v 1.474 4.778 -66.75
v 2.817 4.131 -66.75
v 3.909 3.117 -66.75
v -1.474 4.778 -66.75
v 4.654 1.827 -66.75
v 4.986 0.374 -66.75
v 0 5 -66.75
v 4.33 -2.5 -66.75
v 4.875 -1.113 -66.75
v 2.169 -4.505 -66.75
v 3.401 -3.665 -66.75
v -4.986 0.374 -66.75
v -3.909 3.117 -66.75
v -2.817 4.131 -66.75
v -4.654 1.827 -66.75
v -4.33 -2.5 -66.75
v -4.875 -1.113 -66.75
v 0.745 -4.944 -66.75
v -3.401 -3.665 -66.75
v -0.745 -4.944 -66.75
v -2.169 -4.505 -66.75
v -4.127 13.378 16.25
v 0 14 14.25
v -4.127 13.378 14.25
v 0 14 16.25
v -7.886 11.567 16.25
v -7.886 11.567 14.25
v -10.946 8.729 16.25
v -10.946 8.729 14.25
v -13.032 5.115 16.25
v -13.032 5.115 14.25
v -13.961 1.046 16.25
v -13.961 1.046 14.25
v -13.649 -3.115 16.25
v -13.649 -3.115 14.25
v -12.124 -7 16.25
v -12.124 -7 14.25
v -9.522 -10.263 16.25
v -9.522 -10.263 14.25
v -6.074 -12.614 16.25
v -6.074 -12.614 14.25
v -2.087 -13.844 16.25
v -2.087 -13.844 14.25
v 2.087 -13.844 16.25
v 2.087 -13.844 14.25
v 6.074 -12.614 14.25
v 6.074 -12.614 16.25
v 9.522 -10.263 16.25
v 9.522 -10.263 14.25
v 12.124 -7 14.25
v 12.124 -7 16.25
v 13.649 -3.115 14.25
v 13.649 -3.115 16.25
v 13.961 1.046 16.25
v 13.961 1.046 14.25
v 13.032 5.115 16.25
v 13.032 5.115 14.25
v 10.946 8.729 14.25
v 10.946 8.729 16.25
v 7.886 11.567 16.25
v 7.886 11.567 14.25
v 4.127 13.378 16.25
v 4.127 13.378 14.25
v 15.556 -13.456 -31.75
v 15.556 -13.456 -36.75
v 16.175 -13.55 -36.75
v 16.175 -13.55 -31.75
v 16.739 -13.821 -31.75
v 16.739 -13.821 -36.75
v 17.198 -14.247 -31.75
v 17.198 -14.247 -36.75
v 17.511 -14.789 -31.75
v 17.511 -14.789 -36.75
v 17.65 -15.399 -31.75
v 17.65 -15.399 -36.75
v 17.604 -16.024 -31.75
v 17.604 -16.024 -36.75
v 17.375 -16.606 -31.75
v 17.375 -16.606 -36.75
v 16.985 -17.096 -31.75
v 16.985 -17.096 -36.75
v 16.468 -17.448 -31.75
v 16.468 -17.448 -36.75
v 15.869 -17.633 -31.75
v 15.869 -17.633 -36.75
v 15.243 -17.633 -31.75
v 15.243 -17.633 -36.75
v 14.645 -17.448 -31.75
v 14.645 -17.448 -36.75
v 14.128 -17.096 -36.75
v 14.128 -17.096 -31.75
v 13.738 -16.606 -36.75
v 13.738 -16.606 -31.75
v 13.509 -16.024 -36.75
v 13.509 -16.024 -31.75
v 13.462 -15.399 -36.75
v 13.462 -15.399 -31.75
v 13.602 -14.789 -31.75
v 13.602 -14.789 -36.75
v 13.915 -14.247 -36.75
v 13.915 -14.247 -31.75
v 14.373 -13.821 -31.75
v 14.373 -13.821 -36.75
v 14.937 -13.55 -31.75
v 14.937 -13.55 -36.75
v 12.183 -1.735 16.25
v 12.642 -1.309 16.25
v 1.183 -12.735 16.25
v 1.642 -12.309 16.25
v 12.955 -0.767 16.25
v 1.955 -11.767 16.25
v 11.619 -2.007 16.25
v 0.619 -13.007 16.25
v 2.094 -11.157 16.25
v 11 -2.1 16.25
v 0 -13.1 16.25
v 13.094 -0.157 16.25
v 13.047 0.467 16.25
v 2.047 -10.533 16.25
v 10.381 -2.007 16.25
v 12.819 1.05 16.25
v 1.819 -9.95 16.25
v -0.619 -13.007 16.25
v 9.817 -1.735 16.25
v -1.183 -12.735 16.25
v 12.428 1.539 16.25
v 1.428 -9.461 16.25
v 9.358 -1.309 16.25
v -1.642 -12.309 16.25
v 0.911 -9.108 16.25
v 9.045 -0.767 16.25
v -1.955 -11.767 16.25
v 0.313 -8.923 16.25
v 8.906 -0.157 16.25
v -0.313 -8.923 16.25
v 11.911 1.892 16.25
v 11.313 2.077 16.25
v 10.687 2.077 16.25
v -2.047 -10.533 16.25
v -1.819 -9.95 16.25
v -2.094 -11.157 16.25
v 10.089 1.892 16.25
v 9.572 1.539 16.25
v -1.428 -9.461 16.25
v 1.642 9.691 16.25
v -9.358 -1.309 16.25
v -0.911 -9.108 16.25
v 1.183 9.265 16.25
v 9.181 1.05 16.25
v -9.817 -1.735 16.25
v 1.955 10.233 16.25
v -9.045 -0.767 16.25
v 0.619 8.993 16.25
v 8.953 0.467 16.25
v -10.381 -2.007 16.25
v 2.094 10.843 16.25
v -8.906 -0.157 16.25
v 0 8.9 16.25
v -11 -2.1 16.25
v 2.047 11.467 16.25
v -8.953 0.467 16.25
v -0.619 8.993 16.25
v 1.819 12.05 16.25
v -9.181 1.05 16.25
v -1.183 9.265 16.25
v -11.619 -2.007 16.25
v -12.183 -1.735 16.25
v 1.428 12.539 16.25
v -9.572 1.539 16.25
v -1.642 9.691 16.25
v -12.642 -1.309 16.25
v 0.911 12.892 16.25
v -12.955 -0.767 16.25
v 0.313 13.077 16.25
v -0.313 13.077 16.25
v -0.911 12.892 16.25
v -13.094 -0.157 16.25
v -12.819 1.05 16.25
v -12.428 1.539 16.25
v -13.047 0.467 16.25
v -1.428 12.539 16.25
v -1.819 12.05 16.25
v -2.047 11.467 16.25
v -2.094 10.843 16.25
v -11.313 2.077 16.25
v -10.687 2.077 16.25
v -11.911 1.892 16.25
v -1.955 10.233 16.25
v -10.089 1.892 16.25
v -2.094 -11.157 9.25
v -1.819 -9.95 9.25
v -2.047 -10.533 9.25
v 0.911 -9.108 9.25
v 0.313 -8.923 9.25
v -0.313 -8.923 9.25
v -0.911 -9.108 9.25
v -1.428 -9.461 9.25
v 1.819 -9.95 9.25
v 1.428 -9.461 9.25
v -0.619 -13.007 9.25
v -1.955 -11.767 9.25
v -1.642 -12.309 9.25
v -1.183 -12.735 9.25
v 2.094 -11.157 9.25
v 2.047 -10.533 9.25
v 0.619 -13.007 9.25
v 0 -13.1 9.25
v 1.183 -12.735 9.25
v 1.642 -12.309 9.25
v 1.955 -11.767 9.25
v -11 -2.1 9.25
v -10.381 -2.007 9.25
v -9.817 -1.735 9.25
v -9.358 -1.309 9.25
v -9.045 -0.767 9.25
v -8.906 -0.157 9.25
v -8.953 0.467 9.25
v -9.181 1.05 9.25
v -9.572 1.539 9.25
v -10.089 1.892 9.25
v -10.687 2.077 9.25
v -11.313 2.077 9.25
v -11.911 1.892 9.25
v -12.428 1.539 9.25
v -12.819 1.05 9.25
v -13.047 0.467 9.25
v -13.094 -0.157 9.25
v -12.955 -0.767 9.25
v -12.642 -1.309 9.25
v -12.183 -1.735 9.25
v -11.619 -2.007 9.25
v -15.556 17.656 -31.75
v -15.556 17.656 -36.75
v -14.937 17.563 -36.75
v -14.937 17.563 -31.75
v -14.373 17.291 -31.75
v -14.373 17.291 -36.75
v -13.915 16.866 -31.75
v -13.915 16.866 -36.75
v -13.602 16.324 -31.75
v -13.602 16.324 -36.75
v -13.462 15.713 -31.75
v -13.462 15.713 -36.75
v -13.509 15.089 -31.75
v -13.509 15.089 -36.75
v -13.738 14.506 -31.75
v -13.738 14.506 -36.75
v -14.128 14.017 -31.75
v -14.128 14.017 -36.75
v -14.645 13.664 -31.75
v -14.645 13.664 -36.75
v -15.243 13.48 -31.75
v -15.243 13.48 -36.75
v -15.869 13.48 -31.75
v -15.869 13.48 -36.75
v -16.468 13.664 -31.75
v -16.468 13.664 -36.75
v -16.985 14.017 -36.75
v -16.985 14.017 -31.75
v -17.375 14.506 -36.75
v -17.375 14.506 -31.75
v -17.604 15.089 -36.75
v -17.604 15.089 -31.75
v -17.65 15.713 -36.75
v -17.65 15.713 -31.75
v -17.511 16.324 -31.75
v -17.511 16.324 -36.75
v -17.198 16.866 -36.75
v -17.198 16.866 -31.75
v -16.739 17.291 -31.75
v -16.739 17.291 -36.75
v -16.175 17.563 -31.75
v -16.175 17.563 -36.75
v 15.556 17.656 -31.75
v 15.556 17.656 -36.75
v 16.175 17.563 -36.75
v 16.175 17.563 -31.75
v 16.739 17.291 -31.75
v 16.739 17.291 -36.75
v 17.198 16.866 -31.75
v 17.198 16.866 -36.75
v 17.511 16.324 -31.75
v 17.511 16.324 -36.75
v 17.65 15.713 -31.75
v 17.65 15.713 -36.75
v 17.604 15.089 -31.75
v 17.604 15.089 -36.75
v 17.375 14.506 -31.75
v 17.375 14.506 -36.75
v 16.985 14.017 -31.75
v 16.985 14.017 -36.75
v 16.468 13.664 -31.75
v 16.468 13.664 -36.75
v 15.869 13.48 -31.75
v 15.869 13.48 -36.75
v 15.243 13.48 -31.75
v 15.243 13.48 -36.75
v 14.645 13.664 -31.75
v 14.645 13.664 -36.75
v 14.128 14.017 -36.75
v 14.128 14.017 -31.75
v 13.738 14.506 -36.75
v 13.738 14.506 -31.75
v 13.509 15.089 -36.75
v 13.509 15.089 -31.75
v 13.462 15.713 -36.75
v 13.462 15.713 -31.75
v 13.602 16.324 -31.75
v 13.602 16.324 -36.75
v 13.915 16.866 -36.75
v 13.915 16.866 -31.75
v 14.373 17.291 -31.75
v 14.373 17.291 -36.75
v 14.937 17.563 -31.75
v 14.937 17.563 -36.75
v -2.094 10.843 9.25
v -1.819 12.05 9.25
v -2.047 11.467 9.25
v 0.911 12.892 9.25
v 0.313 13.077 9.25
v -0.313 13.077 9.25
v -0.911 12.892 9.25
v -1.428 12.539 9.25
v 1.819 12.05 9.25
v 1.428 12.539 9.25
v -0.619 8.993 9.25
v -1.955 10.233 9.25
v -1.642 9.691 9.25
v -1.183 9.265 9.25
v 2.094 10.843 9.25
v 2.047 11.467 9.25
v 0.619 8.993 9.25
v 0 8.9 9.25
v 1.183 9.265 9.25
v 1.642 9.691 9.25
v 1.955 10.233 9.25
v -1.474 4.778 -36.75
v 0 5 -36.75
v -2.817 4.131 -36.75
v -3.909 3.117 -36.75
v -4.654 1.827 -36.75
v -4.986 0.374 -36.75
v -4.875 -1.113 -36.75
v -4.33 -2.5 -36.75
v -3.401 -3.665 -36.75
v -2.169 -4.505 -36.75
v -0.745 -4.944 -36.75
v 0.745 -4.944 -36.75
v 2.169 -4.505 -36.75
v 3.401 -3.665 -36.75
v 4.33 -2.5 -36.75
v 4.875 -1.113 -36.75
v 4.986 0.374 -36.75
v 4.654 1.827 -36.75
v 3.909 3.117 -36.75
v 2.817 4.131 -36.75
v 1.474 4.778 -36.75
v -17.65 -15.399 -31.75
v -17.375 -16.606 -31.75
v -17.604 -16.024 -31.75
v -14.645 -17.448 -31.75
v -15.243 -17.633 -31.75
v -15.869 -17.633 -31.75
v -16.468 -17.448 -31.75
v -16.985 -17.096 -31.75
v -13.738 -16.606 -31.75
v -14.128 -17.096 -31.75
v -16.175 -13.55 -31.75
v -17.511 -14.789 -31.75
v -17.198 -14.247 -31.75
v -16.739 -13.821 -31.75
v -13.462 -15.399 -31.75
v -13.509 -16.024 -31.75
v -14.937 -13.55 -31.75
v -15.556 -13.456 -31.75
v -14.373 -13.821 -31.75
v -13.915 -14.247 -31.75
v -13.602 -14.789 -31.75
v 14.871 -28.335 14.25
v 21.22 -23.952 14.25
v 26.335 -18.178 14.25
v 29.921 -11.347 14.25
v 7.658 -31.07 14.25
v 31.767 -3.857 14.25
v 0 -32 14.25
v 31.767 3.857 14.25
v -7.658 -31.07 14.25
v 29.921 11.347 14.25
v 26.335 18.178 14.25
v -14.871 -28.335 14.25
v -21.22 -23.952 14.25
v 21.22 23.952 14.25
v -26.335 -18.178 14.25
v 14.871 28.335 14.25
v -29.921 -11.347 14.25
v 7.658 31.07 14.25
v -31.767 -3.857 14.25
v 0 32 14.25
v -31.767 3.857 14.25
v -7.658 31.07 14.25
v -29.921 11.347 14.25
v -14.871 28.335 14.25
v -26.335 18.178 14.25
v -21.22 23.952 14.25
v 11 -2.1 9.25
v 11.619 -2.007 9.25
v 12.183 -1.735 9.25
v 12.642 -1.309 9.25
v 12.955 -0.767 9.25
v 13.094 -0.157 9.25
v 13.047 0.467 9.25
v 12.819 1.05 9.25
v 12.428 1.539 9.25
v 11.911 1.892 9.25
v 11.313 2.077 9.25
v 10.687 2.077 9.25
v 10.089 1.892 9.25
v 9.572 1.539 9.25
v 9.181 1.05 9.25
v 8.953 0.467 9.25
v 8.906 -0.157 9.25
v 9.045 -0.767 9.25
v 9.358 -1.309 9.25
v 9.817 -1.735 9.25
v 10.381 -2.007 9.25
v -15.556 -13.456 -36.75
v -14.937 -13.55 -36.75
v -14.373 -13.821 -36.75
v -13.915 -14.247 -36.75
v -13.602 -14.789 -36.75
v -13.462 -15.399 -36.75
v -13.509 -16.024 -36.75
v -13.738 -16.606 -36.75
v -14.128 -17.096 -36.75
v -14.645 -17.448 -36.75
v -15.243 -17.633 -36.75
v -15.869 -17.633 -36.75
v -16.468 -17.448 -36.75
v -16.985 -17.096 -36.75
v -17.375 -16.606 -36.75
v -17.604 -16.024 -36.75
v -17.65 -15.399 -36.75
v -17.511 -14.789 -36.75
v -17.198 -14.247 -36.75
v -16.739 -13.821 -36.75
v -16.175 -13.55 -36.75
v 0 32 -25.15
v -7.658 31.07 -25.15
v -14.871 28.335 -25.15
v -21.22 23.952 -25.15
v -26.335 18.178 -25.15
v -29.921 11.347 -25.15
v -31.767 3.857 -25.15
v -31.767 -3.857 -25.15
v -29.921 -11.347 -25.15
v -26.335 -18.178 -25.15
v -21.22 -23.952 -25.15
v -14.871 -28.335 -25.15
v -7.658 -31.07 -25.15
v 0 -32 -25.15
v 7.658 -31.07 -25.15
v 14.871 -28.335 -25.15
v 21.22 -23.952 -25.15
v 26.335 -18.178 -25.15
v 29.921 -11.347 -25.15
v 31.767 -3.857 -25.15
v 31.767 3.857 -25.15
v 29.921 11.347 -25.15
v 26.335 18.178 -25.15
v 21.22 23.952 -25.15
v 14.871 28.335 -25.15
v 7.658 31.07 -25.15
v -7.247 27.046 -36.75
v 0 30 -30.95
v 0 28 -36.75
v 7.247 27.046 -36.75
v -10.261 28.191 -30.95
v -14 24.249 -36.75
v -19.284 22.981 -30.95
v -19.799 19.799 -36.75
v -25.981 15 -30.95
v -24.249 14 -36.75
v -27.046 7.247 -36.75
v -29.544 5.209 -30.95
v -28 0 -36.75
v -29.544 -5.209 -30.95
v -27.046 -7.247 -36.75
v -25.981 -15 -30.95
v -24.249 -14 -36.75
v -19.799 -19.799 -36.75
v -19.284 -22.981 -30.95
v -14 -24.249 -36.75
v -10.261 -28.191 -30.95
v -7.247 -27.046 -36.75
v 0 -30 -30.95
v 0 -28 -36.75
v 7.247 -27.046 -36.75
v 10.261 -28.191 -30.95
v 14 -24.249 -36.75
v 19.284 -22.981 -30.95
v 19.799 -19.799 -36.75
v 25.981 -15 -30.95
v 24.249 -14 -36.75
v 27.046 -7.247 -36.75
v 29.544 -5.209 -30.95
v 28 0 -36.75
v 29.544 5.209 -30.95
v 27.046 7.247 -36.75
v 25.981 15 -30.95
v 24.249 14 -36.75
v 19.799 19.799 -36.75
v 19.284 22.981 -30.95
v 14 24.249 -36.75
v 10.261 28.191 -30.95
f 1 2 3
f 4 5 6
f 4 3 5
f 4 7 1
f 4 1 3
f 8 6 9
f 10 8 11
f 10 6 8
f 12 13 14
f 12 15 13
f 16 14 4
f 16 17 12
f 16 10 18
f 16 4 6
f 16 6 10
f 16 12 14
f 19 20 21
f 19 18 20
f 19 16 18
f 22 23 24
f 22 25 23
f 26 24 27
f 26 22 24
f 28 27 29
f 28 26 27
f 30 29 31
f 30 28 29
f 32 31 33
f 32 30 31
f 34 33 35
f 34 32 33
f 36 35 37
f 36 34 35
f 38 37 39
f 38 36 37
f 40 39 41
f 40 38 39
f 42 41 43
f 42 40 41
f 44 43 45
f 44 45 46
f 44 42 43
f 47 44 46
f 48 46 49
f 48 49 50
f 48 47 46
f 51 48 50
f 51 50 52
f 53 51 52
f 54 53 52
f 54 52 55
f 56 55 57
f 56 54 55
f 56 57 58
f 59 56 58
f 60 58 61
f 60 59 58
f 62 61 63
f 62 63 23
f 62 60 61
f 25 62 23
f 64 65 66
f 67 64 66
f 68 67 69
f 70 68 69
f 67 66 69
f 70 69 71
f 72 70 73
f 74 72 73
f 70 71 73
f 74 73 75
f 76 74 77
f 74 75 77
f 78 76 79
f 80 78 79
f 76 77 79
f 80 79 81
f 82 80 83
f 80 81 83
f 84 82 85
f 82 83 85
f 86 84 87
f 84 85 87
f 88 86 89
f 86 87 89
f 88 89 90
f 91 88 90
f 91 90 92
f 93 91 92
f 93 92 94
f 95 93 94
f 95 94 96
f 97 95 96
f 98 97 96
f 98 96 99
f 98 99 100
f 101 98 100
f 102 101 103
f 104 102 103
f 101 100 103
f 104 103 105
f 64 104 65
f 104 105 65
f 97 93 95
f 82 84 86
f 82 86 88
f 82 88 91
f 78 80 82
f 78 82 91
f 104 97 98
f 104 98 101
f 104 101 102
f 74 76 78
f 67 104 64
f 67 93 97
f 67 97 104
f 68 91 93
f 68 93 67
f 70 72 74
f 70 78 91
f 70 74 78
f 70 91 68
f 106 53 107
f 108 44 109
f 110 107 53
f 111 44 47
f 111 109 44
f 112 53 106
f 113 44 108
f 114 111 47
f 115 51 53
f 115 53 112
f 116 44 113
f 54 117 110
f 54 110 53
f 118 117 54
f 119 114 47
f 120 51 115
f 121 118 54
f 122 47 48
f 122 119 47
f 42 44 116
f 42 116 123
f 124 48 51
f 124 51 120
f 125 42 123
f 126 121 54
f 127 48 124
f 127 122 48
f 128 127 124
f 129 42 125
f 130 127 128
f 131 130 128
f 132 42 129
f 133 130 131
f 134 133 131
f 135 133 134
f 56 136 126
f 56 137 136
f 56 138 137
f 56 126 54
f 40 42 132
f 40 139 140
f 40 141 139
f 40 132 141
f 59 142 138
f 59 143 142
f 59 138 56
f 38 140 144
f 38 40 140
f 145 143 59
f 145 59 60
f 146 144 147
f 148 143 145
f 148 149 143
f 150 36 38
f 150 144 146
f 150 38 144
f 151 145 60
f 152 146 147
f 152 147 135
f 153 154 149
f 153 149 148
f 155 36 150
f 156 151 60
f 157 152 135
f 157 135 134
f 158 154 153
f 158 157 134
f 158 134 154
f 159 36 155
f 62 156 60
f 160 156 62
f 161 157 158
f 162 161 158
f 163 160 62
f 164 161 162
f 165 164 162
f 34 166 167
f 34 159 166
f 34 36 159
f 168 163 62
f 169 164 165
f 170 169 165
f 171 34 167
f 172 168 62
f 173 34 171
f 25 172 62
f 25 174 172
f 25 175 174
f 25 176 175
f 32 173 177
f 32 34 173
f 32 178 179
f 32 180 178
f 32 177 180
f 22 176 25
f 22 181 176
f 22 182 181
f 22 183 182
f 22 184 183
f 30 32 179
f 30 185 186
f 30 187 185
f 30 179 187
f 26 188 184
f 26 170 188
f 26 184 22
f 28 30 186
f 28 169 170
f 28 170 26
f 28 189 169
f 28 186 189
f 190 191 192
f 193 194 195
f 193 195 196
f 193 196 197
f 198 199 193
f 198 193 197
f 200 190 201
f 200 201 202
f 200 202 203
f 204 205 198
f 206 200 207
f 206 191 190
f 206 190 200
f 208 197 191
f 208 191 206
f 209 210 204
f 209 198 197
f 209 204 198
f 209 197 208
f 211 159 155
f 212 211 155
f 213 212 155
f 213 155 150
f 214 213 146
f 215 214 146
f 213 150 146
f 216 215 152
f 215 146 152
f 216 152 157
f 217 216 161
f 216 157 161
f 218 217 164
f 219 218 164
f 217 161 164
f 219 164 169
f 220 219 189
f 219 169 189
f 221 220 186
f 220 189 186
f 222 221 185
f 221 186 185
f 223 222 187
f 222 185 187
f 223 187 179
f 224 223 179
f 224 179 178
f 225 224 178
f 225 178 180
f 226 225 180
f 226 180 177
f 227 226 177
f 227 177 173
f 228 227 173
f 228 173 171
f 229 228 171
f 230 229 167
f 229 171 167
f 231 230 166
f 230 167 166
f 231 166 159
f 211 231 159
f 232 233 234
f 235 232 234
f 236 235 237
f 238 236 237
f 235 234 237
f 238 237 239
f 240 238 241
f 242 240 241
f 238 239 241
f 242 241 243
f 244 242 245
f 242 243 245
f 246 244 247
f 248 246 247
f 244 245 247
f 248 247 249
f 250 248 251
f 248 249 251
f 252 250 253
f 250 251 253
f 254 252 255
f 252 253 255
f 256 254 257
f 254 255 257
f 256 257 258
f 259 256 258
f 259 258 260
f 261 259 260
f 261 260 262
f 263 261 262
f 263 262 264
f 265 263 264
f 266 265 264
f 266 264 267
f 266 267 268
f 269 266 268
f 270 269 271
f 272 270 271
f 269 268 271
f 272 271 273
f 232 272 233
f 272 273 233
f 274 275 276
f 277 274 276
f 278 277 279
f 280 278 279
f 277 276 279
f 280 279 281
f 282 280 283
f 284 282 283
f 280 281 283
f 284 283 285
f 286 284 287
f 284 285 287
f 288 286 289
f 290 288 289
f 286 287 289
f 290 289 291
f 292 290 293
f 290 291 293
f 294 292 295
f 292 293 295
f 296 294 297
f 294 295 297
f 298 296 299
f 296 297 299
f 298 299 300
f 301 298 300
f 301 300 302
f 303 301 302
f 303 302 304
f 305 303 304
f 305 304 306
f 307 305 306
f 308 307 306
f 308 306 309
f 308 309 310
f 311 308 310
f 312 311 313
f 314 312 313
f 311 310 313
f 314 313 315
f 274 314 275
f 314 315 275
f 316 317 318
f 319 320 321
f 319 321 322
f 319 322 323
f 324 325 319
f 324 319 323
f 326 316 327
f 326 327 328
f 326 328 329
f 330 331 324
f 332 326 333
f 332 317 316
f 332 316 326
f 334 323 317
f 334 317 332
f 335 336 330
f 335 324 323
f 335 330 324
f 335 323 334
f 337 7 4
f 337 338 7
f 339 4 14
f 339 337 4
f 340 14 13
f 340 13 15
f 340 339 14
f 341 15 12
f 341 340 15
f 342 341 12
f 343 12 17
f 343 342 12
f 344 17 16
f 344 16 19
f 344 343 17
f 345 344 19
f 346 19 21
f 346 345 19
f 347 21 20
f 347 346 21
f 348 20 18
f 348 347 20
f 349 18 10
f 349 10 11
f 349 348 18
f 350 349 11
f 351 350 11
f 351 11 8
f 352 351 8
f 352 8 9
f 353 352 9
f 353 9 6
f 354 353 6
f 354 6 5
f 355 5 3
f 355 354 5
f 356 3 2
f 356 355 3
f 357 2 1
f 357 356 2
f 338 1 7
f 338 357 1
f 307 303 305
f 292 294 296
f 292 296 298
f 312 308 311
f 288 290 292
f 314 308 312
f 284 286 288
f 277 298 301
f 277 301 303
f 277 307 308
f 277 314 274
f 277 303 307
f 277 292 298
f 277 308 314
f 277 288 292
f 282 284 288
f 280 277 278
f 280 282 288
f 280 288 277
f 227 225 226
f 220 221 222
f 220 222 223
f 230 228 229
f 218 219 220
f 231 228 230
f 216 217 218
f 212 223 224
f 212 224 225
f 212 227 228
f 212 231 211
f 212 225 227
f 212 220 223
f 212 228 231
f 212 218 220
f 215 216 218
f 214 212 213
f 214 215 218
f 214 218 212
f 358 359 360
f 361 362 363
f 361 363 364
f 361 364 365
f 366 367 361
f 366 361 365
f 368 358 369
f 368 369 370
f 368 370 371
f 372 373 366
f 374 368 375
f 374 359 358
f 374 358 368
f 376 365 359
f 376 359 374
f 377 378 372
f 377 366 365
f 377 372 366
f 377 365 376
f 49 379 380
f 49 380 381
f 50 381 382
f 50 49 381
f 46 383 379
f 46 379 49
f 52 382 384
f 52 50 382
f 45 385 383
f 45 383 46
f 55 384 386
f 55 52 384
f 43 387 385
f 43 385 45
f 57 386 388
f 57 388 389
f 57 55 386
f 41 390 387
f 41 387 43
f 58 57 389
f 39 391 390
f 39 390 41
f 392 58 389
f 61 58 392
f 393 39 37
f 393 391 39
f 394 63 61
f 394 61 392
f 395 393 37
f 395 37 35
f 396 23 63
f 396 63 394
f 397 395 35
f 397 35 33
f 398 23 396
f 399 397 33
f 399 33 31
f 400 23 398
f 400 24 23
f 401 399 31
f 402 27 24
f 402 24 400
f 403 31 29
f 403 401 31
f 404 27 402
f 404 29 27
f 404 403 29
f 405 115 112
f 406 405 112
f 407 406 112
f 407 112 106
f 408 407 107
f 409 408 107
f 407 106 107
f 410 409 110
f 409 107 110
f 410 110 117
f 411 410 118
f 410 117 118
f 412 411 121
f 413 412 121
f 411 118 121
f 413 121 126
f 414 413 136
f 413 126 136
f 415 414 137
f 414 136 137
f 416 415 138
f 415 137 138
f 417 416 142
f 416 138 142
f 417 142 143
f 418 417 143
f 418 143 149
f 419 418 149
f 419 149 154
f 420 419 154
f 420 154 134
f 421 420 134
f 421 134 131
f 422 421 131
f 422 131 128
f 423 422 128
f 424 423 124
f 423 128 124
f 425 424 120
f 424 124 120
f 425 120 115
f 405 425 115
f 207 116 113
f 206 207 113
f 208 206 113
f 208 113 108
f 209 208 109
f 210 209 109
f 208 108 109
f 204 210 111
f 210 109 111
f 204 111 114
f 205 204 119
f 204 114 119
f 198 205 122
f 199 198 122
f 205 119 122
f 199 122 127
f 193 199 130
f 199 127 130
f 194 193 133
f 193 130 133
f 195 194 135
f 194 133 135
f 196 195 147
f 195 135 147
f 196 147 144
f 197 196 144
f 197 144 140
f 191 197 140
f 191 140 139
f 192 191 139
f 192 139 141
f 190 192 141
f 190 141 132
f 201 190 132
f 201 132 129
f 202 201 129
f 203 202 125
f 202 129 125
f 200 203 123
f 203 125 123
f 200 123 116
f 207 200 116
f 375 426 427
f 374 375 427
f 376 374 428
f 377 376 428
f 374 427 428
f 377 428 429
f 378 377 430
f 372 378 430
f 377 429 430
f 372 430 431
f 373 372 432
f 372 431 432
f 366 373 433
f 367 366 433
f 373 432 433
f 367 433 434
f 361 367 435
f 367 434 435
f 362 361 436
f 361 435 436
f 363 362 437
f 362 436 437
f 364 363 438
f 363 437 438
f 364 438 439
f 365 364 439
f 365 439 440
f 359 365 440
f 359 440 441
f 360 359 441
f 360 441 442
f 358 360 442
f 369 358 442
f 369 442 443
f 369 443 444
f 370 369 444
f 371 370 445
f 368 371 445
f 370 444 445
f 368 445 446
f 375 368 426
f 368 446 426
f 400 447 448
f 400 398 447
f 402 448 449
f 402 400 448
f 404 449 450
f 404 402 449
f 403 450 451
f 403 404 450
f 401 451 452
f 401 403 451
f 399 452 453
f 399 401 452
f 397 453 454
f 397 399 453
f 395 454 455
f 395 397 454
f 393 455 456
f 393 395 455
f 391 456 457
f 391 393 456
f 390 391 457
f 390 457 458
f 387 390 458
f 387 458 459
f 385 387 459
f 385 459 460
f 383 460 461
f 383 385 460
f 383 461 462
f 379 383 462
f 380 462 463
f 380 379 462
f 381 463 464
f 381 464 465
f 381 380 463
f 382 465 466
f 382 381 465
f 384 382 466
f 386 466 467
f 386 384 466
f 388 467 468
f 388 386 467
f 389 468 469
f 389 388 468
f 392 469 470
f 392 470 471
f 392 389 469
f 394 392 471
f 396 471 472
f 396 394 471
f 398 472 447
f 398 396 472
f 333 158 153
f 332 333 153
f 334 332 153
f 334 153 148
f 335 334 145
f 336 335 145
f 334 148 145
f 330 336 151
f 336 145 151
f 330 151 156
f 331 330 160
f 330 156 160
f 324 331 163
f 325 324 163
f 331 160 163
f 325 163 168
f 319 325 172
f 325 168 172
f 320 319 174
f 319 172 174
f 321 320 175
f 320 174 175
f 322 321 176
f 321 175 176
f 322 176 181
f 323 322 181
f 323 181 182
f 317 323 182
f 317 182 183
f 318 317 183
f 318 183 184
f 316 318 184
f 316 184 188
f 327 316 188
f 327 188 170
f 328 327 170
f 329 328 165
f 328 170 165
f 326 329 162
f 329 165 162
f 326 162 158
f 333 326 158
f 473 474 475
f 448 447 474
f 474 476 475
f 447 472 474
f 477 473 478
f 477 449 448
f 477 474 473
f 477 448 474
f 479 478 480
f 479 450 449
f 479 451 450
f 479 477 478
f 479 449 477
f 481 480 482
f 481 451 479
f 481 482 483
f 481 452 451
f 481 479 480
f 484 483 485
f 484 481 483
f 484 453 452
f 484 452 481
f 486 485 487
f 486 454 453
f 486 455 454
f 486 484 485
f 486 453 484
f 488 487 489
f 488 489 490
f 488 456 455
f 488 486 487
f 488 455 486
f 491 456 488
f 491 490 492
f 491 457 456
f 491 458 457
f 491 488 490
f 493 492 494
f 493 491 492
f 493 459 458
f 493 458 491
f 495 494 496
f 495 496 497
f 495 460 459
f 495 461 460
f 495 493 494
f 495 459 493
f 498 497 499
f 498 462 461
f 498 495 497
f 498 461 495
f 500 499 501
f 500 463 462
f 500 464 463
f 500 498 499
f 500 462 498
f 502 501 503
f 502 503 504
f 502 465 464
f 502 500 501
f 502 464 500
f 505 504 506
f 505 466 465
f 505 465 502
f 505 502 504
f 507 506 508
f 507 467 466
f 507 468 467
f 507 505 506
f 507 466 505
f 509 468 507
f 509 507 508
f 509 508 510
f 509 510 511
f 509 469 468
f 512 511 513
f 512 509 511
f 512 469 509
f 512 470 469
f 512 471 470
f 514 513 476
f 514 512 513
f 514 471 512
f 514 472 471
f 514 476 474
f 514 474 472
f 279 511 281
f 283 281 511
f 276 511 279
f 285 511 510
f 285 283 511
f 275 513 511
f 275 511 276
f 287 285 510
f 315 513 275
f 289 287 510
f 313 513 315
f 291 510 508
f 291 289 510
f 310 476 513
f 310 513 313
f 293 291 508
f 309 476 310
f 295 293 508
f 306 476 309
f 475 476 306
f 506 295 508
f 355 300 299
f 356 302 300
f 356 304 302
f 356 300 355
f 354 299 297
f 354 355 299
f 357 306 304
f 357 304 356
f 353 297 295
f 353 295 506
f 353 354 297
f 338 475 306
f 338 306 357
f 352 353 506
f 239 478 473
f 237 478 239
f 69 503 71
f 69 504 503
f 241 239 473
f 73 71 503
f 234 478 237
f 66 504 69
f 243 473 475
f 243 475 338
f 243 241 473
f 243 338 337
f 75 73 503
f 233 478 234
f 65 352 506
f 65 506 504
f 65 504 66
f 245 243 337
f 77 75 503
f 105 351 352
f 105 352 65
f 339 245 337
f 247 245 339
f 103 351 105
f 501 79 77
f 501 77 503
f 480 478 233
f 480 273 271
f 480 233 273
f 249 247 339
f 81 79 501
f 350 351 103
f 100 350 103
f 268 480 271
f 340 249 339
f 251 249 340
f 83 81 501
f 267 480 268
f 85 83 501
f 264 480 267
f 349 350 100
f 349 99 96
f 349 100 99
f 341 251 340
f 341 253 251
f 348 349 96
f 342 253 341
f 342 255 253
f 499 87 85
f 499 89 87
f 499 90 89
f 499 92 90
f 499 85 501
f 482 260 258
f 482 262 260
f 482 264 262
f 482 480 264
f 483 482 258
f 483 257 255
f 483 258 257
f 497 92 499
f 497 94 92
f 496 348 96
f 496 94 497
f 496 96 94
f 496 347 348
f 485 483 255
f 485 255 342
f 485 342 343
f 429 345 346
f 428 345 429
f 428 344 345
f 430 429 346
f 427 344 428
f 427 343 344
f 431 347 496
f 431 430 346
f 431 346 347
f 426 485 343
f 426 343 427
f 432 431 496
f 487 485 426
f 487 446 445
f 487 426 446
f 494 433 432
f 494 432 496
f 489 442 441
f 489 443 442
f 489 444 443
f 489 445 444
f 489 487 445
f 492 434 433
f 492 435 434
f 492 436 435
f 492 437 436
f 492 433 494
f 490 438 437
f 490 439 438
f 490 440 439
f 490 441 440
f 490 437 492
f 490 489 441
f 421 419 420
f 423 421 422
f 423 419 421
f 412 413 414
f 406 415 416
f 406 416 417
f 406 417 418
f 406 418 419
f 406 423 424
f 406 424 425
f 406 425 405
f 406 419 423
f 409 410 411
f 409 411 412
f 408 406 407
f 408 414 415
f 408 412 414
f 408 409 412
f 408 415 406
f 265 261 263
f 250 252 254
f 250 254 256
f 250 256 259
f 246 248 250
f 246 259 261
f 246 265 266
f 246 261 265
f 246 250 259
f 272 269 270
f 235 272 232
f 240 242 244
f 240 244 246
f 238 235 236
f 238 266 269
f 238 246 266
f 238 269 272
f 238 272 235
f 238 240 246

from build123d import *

# Parameters (mm, degrees)
SKETCH_R                = 2.1
POCKET_DEPTH            = 5
SKETCH002_R             = 2.1
POCKET001_DEPTH         = 7
BODY001_ROLL_ANGLE      = 90
BODY001_PLACEMENT_ANGLE = 90


with BuildPart() as part:
    # Sketch001 → Revolution001 (revolve)
    with BuildSketch(Plane.XY):
        Polygon((28, 0), (32, 11.6), (32, 51), (14, 51), (14, 53), (0, 53), (0, 0), (0, -30), (5, -30), (5, 0), align=None)
    revolve(axis=Axis((0, 0, 0), (0, 1, 0)))

    # Sketch → Pocket (cut)
    with BuildSketch(Plane.XZ):
        with Locations((-15.556349, 15.556349)):
            Circle(SKETCH_R)
        with Locations((15.556349, 15.556349)):
            Circle(SKETCH_R)
        with Locations((15.556349, -15.556349)):
            Circle(SKETCH_R)
        with Locations((-15.556349, -15.556349)):
            Circle(SKETCH_R)
    extrude(amount=-POCKET_DEPTH, mode=Mode.SUBTRACT)

    # Sketch002 (on Face16 of Pocket) → Pocket001 (cut)
    with BuildSketch(Plane(origin=(0, 53, 0), x_dir=(-1, 0, 0), z_dir=(0, 1, 0))):
        with Locations((-11, 0)):
            Circle(SKETCH002_R)
        with Locations((0, -11)):
            Circle(SKETCH002_R)
        with Locations((11, 0)):
            Circle(SKETCH002_R)
        with Locations((0, 11)):
            Circle(SKETCH002_R)
    extrude(amount=-POCKET001_DEPTH, mode=Mode.SUBTRACT)


with BuildPart() as part_1:
    # Body001 roll: moved
    add(part.part.rotate(Axis((0, 0, 0), (1, 0, 0)), BODY001_ROLL_ANGLE))


with BuildPart() as part_2:
    # Body001 placement: moved
    add(part_1.part.moved(Location((0, 0, -36.75))).rotate(Axis((0, 0, -36.75), (0, 0, 1)), BODY001_PLACEMENT_ANGLE))


solid = part_2.part
